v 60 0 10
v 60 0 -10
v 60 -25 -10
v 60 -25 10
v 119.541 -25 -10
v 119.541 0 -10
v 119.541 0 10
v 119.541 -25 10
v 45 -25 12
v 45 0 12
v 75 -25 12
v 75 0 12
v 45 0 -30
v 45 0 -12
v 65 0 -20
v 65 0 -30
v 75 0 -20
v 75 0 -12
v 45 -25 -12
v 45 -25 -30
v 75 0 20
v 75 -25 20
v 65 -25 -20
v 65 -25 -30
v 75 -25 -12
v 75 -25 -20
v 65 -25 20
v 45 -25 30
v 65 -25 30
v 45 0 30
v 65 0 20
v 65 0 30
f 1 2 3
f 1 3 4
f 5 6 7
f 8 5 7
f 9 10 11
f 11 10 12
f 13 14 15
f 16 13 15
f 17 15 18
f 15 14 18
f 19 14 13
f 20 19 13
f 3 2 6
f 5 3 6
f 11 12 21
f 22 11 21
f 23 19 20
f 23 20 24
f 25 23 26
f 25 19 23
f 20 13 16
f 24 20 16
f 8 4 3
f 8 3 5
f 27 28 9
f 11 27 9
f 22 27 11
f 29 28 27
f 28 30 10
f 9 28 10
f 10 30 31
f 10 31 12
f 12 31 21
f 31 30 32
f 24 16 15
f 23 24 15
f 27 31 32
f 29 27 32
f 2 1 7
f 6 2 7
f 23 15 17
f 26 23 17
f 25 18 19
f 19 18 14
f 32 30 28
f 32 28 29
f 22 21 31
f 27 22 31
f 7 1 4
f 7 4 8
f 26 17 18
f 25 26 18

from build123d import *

# Parameters (mm, degrees)
F0_W     = 20
F0_H     = 10
F0_W_2   = 59.541454
F0_H_2   = 20
F1_DEPTH = 25


with BuildPart() as f1:
    # F0 (on Front) → F1 (new body)
    with BuildSketch(Plane.XZ):
        with Locations((55, 25)):
            Rectangle(F0_W, F0_H)
        Polygon((65, 20), (45, 20), (45, 12), (75, 12), (75, 20), align=None)
        with Locations((89.770727, 0)):
            Rectangle(F0_W_2, F0_H_2)
        Polygon((45, -12), (45, -20), (65, -20), (75, -20), (75, -12), align=None)
        with Locations((55, -25)):
            Rectangle(F0_W, F0_H)
    extrude(amount=F1_DEPTH)


solid = f1.part
